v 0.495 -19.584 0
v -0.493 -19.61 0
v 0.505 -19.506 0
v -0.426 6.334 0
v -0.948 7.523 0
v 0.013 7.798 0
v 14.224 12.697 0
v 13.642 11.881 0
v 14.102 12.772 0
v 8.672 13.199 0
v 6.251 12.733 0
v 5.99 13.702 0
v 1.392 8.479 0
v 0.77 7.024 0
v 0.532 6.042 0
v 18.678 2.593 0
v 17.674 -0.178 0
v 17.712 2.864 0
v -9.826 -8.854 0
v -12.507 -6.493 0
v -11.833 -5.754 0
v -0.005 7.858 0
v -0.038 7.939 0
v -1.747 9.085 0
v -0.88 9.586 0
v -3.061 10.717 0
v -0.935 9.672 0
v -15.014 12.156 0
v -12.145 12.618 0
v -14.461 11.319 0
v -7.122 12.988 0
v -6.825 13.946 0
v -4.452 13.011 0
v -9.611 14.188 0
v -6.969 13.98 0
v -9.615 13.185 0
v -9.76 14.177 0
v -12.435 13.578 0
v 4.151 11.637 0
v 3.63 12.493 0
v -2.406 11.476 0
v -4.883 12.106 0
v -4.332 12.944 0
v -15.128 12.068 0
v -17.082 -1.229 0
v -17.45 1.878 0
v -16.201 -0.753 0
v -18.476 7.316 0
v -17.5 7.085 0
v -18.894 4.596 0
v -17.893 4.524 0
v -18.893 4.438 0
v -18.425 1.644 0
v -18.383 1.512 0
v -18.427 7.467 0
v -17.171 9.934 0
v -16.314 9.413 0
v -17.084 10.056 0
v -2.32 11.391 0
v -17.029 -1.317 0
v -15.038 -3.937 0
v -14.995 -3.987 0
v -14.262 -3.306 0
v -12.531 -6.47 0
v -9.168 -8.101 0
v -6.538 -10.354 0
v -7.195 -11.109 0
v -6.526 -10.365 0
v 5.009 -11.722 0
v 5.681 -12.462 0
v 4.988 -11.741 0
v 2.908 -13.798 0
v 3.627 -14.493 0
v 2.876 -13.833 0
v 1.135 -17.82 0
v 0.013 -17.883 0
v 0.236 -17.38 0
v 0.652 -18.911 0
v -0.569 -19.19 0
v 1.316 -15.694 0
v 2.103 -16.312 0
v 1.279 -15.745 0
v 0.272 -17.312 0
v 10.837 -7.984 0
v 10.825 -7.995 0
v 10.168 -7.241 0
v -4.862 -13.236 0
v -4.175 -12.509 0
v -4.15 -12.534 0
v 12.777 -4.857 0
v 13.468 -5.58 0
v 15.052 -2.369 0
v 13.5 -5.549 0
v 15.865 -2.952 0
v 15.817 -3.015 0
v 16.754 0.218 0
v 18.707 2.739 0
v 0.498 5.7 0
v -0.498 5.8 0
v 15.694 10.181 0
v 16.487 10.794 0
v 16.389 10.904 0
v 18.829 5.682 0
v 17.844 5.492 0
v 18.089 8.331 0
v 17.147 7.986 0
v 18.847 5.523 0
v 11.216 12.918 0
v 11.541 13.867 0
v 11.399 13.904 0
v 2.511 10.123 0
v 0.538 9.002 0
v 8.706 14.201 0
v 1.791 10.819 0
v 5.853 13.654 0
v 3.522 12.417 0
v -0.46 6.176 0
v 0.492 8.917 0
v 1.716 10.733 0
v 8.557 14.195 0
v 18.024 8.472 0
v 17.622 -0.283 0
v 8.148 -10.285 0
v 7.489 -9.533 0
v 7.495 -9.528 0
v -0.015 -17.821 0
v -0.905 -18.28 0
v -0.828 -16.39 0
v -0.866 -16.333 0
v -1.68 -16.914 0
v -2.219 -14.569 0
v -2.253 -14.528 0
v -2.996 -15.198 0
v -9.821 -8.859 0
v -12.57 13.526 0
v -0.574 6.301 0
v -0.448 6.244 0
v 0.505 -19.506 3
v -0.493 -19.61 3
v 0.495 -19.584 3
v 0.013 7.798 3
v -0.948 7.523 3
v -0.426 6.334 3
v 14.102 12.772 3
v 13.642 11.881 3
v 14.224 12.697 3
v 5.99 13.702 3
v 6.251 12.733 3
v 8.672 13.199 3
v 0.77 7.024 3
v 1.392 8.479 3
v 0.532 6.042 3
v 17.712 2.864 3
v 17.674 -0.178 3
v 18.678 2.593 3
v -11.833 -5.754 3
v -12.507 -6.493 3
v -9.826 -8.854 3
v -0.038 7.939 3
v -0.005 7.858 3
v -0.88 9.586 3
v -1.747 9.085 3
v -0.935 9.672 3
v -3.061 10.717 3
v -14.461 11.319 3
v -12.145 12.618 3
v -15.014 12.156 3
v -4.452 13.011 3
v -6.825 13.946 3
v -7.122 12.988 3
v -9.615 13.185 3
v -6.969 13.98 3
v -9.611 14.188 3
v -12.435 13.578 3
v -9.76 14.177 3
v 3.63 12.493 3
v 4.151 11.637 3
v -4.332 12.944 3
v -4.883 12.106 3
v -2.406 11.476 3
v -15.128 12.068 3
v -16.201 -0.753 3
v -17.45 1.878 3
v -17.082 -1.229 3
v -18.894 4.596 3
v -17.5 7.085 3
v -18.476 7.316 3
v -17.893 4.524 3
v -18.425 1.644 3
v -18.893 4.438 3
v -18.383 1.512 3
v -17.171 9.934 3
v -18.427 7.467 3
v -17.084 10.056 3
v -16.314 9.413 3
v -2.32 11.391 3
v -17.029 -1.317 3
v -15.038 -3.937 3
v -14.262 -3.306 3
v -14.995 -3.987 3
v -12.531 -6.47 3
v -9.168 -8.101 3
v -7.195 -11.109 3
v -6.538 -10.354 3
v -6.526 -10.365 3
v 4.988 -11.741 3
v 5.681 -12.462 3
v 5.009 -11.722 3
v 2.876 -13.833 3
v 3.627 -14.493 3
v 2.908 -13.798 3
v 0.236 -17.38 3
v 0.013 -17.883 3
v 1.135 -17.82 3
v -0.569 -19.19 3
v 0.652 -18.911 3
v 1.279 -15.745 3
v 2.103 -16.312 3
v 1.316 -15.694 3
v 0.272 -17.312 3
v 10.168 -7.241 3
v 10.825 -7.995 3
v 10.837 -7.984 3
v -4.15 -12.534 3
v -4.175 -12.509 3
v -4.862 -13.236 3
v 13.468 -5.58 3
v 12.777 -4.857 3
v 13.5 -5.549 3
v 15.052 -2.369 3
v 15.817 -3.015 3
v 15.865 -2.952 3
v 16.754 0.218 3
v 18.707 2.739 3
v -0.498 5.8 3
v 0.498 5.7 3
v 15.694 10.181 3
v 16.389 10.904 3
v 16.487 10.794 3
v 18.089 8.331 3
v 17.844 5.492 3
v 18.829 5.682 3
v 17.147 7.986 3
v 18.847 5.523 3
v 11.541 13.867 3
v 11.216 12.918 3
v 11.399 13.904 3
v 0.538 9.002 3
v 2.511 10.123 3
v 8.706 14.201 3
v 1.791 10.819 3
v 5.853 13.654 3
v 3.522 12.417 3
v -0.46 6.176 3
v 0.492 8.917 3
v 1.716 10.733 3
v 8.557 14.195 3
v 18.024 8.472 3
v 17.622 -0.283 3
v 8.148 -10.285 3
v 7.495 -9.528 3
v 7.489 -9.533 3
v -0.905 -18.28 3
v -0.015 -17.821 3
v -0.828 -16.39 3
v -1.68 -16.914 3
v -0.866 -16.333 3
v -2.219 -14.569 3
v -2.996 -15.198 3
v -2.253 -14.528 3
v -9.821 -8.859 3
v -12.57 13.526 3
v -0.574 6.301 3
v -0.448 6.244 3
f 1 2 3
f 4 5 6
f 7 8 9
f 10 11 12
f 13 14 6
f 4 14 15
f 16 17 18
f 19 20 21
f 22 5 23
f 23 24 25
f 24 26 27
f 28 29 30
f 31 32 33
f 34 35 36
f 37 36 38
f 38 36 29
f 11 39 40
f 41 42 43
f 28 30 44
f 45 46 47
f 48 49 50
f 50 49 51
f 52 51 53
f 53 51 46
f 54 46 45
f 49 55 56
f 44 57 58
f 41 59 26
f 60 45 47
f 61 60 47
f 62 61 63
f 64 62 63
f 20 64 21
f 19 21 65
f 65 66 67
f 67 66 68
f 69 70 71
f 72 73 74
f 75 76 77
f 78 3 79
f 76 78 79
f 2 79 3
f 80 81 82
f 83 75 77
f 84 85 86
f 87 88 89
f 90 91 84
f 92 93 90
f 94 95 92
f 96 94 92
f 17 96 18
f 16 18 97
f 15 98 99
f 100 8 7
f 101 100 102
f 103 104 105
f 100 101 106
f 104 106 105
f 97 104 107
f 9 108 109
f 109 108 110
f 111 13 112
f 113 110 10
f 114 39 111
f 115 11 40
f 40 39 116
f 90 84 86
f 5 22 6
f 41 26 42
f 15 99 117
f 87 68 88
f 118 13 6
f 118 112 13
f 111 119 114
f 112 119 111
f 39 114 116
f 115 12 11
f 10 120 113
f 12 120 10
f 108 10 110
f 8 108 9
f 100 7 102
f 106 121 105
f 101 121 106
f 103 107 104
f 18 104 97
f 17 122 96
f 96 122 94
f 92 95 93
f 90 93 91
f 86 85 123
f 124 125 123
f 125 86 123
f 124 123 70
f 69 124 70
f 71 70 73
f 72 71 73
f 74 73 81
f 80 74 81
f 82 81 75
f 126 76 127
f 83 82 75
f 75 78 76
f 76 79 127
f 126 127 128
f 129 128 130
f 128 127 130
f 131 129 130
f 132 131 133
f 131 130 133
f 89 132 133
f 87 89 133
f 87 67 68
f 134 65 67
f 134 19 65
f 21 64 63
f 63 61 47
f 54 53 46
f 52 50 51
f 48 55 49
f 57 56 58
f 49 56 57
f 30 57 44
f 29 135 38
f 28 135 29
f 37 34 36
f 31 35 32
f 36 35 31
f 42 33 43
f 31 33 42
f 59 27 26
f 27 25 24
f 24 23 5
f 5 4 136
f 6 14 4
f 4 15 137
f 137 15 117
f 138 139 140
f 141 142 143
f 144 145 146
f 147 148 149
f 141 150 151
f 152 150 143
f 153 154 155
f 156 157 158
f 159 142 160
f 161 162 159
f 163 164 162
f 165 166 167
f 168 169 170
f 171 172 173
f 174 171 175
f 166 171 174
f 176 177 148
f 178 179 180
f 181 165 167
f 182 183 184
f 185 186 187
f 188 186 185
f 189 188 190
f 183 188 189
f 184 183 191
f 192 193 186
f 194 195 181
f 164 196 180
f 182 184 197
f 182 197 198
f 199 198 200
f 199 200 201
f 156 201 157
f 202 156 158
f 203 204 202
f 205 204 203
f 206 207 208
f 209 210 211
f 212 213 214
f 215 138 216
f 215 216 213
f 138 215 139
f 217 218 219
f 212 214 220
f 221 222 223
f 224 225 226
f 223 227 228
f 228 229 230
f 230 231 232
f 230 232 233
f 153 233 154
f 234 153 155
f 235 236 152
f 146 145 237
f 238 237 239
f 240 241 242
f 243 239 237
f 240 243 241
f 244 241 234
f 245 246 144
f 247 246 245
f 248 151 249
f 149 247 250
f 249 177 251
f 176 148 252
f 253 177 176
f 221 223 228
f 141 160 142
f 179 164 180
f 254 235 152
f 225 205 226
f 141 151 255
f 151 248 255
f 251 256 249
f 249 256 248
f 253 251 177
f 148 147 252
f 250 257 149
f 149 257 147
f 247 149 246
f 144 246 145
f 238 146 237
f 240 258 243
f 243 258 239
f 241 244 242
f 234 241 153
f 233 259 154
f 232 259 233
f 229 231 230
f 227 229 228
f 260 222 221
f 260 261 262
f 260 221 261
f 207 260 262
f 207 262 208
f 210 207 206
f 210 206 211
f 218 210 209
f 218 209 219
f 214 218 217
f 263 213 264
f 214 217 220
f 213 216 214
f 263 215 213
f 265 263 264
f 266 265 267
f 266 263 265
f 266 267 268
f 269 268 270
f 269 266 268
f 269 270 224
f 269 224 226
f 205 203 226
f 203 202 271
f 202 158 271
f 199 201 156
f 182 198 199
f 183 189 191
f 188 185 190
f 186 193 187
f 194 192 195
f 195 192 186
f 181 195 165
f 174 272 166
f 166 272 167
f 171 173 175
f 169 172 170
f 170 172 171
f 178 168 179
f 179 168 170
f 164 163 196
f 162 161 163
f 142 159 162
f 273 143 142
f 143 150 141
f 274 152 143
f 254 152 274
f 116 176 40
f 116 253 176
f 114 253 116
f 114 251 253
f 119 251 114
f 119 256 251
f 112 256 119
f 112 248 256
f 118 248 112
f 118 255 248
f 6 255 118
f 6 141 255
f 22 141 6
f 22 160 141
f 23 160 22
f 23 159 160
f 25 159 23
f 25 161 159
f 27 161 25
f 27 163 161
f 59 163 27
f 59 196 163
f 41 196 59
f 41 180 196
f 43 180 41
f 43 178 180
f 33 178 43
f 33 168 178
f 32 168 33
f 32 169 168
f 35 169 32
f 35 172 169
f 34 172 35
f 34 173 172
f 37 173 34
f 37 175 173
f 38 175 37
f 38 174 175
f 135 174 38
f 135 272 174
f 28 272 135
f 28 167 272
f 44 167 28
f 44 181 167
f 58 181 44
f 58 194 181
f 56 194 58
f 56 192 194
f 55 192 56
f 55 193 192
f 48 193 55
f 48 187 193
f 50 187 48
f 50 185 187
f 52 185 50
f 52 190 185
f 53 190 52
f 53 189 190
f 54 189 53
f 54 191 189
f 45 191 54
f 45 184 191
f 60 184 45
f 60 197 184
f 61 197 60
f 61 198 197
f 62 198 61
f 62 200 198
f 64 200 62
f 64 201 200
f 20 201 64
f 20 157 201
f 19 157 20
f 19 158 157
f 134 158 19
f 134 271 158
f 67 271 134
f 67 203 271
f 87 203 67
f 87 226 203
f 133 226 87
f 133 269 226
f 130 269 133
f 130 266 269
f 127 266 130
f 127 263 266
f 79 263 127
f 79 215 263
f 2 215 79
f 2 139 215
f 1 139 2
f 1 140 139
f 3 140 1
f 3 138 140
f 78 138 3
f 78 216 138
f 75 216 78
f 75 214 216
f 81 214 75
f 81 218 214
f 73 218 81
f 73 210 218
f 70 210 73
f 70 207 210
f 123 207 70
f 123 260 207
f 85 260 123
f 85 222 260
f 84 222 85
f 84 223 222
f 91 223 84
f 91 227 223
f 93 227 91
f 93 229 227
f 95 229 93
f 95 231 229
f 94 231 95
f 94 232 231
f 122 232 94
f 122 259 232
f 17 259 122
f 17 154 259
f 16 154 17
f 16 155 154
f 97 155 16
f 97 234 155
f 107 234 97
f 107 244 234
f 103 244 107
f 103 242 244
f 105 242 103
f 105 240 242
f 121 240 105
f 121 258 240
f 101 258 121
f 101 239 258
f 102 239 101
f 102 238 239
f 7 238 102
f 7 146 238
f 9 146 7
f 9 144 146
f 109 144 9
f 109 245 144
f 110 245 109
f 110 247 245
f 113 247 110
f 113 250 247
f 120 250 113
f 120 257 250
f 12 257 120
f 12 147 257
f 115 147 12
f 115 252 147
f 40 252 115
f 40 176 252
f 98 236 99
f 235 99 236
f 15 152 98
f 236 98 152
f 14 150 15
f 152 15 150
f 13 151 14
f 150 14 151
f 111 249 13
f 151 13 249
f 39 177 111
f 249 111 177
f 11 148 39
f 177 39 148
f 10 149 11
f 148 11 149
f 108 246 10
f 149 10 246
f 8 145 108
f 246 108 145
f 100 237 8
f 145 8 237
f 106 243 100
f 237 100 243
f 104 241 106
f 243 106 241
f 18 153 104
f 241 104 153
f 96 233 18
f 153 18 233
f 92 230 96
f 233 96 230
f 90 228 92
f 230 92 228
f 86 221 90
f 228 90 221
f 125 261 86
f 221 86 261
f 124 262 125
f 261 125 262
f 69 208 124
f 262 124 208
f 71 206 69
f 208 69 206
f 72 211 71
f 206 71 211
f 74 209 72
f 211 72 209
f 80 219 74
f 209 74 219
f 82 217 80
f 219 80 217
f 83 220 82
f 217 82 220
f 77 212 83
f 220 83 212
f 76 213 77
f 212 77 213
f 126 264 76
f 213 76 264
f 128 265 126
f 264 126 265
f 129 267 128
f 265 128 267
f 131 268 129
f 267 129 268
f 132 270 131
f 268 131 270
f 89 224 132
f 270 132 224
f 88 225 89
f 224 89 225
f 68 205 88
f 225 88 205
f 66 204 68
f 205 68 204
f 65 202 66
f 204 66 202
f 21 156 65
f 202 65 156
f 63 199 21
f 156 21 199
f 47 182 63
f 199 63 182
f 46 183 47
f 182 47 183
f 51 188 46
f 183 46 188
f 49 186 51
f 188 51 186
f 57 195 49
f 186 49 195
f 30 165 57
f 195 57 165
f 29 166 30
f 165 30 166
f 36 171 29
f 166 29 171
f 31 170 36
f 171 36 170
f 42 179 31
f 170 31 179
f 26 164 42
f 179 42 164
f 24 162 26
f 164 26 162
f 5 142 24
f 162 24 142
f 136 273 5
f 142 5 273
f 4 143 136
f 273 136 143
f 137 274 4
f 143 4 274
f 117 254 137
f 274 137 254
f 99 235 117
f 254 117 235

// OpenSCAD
// mathgrrl broken heart - OpenSCAD parametric graph example

/////////////////////////////////////////////////////////////
// EXTENSIONS ///////////////////////////////////////////////

// curriculum.makerbot.com/daily_tutorial/openscad/openscad_05.html
// include <EXTENSIONS/2dgraph.scad>

/////////////////////////////////////////////////////////////
// PARAMETERS ///////////////////////////////////////////////

// Set the diameter of the heart, in mm
heart_diameter = 20;

// Set the thickness of the line, in mm
line_thickness = 1;

// Set the height of the model, in mm
line_height = 3;

// Choose low numbers for jagged, high for smooth
number_of_steps = 48;

scalefactor = heart_diameter*1.15/20;

/////////////////////////////////////////////////////////////
// RENDERS //////////////////////////////////////////////////

// broken heart parametric curve
// equation from http://mathworld.wolfram.com/HeartCurve.html
function x(t) = scalefactor*16*pow(sin(t),3);
function y(t) = scalefactor*(13*cos(t)-5*cos(2*t)-2*cos(3*t)-cos(4*t));

// make the graph and extrude it
linear_extrude(height=line_height)
	2dgraph(	[0, 350], 				// stop before 360 to make broken
				line_thickness, 		// set line thickness
				steps=number_of_steps,// choose low/high poly look
				parametric=true);		// use parametric grapher

/////////////////////////////////////////////////////////////
// MODULES //////////////////////////////////////////////////

// in Customizer we need to include these to use 2dgraph?
// curriculum.makerbot.com/daily_tutorial/openscad/openscad_05.html

// These functions are here to help get the slope of each segment, and use that to find points for a correctly oriented polygon
function diffx(x1, y1, x2, y2, th) = cos(atan((y2-y1)/(x2-x1)) + 90)*(th/2);
function diffy(x1, y1, x2, y2, th) = sin(atan((y2-y1)/(x2-x1)) + 90)*(th/2);
function point1(x1, y1, x2, y2, th) = [x1-diffx(x1, y1, x2, y2, th), y1-diffy(x1, y1, x2, y2, th)];
function point2(x1, y1, x2, y2, th) = [x2-diffx(x1, y1, x2, y2, th), y2-diffy(x1, y1, x2, y2, th)];
function point3(x1, y1, x2, y2, th) = [x2+diffx(x1, y1, x2, y2, th), y2+diffy(x1, y1, x2, y2, th)];
function point4(x1, y1, x2, y2, th) = [x1+diffx(x1, y1, x2, y2, th), y1+diffy(x1, y1, x2, y2, th)];
function polarX(theta) = cos(theta)*r(theta);
function polarY(theta) = sin(theta)*r(theta);

module nextPolygon(x1, y1, x2, y2, x3, y3, th) {
    if((x2 > x1 && x2-diffx(x2, y2, x3, y3, th) < x2-diffx(x1, y1, x2, y2, th) || (x2 <= x1 && x2-diffx(x2, y2, x3, y3, th) > x2-diffx(x1, y1, x2, y2, th)))) {
        polygon(
            points = [
                point1(x1, y1, x2, y2, th),
                point2(x1, y1, x2, y2, th),
                // This point connects this segment to the next
                point4(x2, y2, x3, y3, th),
                point3(x1, y1, x2, y2, th),
                point4(x1, y1, x2, y2, th)
            ],
            paths = [[0,1,2,3,4]]
        );
    }
    else if((x2 > x1 && x2-diffx(x2, y2, x3, y3, th) > x2-diffx(x1, y1, x2, y2, th) || (x2 <= x1 && x2-diffx(x2, y2, x3, y3, th) < x2-diffx(x1, y1, x2, y2, th)))) {
        polygon(
            points = [
                point1(x1, y1, x2, y2, th),
                point2(x1, y1, x2, y2, th),
                // This point connects this segment to the next
                point1(x2, y2, x3, y3, th),
                point3(x1, y1, x2, y2, th),
                point4(x1, y1, x2, y2, th)
            ],
            paths = [[0,1,2,3,4]]
        );
    }
    else {
        polygon(
            points = [
                point1(x1, y1, x2, y2, th),
                point2(x1, y1, x2, y2, th),
                point3(x1, y1, x2, y2, th),
                point4(x1, y1, x2, y2, th)
            ],
            paths = [[0,1,2,3]]
        );
    }
}

module 2dgraph(bounds=[-10,10], th=2, steps=10, polar=false, parametric=false) {

    step = (bounds[1]-bounds[0])/steps;
    union() {
        for(i = [bounds[0]:step:bounds[1]-step]) {
            if(polar) {
                nextPolygon(polarX(i), polarY(i), polarX(i+step), polarY(i+step), polarX(i+2*step), polarY(i+2*step), th);
            }
            else if(parametric) {
                nextPolygon(x(i), y(i), x(i+step), y(i+step), x(i+2*step), y(i+2*step), th);
            }
            else {
                nextPolygon(i, f(i), i+step, f(i+step), i+2*step, f(i+2*step), th);
            }
        }
    }
}
